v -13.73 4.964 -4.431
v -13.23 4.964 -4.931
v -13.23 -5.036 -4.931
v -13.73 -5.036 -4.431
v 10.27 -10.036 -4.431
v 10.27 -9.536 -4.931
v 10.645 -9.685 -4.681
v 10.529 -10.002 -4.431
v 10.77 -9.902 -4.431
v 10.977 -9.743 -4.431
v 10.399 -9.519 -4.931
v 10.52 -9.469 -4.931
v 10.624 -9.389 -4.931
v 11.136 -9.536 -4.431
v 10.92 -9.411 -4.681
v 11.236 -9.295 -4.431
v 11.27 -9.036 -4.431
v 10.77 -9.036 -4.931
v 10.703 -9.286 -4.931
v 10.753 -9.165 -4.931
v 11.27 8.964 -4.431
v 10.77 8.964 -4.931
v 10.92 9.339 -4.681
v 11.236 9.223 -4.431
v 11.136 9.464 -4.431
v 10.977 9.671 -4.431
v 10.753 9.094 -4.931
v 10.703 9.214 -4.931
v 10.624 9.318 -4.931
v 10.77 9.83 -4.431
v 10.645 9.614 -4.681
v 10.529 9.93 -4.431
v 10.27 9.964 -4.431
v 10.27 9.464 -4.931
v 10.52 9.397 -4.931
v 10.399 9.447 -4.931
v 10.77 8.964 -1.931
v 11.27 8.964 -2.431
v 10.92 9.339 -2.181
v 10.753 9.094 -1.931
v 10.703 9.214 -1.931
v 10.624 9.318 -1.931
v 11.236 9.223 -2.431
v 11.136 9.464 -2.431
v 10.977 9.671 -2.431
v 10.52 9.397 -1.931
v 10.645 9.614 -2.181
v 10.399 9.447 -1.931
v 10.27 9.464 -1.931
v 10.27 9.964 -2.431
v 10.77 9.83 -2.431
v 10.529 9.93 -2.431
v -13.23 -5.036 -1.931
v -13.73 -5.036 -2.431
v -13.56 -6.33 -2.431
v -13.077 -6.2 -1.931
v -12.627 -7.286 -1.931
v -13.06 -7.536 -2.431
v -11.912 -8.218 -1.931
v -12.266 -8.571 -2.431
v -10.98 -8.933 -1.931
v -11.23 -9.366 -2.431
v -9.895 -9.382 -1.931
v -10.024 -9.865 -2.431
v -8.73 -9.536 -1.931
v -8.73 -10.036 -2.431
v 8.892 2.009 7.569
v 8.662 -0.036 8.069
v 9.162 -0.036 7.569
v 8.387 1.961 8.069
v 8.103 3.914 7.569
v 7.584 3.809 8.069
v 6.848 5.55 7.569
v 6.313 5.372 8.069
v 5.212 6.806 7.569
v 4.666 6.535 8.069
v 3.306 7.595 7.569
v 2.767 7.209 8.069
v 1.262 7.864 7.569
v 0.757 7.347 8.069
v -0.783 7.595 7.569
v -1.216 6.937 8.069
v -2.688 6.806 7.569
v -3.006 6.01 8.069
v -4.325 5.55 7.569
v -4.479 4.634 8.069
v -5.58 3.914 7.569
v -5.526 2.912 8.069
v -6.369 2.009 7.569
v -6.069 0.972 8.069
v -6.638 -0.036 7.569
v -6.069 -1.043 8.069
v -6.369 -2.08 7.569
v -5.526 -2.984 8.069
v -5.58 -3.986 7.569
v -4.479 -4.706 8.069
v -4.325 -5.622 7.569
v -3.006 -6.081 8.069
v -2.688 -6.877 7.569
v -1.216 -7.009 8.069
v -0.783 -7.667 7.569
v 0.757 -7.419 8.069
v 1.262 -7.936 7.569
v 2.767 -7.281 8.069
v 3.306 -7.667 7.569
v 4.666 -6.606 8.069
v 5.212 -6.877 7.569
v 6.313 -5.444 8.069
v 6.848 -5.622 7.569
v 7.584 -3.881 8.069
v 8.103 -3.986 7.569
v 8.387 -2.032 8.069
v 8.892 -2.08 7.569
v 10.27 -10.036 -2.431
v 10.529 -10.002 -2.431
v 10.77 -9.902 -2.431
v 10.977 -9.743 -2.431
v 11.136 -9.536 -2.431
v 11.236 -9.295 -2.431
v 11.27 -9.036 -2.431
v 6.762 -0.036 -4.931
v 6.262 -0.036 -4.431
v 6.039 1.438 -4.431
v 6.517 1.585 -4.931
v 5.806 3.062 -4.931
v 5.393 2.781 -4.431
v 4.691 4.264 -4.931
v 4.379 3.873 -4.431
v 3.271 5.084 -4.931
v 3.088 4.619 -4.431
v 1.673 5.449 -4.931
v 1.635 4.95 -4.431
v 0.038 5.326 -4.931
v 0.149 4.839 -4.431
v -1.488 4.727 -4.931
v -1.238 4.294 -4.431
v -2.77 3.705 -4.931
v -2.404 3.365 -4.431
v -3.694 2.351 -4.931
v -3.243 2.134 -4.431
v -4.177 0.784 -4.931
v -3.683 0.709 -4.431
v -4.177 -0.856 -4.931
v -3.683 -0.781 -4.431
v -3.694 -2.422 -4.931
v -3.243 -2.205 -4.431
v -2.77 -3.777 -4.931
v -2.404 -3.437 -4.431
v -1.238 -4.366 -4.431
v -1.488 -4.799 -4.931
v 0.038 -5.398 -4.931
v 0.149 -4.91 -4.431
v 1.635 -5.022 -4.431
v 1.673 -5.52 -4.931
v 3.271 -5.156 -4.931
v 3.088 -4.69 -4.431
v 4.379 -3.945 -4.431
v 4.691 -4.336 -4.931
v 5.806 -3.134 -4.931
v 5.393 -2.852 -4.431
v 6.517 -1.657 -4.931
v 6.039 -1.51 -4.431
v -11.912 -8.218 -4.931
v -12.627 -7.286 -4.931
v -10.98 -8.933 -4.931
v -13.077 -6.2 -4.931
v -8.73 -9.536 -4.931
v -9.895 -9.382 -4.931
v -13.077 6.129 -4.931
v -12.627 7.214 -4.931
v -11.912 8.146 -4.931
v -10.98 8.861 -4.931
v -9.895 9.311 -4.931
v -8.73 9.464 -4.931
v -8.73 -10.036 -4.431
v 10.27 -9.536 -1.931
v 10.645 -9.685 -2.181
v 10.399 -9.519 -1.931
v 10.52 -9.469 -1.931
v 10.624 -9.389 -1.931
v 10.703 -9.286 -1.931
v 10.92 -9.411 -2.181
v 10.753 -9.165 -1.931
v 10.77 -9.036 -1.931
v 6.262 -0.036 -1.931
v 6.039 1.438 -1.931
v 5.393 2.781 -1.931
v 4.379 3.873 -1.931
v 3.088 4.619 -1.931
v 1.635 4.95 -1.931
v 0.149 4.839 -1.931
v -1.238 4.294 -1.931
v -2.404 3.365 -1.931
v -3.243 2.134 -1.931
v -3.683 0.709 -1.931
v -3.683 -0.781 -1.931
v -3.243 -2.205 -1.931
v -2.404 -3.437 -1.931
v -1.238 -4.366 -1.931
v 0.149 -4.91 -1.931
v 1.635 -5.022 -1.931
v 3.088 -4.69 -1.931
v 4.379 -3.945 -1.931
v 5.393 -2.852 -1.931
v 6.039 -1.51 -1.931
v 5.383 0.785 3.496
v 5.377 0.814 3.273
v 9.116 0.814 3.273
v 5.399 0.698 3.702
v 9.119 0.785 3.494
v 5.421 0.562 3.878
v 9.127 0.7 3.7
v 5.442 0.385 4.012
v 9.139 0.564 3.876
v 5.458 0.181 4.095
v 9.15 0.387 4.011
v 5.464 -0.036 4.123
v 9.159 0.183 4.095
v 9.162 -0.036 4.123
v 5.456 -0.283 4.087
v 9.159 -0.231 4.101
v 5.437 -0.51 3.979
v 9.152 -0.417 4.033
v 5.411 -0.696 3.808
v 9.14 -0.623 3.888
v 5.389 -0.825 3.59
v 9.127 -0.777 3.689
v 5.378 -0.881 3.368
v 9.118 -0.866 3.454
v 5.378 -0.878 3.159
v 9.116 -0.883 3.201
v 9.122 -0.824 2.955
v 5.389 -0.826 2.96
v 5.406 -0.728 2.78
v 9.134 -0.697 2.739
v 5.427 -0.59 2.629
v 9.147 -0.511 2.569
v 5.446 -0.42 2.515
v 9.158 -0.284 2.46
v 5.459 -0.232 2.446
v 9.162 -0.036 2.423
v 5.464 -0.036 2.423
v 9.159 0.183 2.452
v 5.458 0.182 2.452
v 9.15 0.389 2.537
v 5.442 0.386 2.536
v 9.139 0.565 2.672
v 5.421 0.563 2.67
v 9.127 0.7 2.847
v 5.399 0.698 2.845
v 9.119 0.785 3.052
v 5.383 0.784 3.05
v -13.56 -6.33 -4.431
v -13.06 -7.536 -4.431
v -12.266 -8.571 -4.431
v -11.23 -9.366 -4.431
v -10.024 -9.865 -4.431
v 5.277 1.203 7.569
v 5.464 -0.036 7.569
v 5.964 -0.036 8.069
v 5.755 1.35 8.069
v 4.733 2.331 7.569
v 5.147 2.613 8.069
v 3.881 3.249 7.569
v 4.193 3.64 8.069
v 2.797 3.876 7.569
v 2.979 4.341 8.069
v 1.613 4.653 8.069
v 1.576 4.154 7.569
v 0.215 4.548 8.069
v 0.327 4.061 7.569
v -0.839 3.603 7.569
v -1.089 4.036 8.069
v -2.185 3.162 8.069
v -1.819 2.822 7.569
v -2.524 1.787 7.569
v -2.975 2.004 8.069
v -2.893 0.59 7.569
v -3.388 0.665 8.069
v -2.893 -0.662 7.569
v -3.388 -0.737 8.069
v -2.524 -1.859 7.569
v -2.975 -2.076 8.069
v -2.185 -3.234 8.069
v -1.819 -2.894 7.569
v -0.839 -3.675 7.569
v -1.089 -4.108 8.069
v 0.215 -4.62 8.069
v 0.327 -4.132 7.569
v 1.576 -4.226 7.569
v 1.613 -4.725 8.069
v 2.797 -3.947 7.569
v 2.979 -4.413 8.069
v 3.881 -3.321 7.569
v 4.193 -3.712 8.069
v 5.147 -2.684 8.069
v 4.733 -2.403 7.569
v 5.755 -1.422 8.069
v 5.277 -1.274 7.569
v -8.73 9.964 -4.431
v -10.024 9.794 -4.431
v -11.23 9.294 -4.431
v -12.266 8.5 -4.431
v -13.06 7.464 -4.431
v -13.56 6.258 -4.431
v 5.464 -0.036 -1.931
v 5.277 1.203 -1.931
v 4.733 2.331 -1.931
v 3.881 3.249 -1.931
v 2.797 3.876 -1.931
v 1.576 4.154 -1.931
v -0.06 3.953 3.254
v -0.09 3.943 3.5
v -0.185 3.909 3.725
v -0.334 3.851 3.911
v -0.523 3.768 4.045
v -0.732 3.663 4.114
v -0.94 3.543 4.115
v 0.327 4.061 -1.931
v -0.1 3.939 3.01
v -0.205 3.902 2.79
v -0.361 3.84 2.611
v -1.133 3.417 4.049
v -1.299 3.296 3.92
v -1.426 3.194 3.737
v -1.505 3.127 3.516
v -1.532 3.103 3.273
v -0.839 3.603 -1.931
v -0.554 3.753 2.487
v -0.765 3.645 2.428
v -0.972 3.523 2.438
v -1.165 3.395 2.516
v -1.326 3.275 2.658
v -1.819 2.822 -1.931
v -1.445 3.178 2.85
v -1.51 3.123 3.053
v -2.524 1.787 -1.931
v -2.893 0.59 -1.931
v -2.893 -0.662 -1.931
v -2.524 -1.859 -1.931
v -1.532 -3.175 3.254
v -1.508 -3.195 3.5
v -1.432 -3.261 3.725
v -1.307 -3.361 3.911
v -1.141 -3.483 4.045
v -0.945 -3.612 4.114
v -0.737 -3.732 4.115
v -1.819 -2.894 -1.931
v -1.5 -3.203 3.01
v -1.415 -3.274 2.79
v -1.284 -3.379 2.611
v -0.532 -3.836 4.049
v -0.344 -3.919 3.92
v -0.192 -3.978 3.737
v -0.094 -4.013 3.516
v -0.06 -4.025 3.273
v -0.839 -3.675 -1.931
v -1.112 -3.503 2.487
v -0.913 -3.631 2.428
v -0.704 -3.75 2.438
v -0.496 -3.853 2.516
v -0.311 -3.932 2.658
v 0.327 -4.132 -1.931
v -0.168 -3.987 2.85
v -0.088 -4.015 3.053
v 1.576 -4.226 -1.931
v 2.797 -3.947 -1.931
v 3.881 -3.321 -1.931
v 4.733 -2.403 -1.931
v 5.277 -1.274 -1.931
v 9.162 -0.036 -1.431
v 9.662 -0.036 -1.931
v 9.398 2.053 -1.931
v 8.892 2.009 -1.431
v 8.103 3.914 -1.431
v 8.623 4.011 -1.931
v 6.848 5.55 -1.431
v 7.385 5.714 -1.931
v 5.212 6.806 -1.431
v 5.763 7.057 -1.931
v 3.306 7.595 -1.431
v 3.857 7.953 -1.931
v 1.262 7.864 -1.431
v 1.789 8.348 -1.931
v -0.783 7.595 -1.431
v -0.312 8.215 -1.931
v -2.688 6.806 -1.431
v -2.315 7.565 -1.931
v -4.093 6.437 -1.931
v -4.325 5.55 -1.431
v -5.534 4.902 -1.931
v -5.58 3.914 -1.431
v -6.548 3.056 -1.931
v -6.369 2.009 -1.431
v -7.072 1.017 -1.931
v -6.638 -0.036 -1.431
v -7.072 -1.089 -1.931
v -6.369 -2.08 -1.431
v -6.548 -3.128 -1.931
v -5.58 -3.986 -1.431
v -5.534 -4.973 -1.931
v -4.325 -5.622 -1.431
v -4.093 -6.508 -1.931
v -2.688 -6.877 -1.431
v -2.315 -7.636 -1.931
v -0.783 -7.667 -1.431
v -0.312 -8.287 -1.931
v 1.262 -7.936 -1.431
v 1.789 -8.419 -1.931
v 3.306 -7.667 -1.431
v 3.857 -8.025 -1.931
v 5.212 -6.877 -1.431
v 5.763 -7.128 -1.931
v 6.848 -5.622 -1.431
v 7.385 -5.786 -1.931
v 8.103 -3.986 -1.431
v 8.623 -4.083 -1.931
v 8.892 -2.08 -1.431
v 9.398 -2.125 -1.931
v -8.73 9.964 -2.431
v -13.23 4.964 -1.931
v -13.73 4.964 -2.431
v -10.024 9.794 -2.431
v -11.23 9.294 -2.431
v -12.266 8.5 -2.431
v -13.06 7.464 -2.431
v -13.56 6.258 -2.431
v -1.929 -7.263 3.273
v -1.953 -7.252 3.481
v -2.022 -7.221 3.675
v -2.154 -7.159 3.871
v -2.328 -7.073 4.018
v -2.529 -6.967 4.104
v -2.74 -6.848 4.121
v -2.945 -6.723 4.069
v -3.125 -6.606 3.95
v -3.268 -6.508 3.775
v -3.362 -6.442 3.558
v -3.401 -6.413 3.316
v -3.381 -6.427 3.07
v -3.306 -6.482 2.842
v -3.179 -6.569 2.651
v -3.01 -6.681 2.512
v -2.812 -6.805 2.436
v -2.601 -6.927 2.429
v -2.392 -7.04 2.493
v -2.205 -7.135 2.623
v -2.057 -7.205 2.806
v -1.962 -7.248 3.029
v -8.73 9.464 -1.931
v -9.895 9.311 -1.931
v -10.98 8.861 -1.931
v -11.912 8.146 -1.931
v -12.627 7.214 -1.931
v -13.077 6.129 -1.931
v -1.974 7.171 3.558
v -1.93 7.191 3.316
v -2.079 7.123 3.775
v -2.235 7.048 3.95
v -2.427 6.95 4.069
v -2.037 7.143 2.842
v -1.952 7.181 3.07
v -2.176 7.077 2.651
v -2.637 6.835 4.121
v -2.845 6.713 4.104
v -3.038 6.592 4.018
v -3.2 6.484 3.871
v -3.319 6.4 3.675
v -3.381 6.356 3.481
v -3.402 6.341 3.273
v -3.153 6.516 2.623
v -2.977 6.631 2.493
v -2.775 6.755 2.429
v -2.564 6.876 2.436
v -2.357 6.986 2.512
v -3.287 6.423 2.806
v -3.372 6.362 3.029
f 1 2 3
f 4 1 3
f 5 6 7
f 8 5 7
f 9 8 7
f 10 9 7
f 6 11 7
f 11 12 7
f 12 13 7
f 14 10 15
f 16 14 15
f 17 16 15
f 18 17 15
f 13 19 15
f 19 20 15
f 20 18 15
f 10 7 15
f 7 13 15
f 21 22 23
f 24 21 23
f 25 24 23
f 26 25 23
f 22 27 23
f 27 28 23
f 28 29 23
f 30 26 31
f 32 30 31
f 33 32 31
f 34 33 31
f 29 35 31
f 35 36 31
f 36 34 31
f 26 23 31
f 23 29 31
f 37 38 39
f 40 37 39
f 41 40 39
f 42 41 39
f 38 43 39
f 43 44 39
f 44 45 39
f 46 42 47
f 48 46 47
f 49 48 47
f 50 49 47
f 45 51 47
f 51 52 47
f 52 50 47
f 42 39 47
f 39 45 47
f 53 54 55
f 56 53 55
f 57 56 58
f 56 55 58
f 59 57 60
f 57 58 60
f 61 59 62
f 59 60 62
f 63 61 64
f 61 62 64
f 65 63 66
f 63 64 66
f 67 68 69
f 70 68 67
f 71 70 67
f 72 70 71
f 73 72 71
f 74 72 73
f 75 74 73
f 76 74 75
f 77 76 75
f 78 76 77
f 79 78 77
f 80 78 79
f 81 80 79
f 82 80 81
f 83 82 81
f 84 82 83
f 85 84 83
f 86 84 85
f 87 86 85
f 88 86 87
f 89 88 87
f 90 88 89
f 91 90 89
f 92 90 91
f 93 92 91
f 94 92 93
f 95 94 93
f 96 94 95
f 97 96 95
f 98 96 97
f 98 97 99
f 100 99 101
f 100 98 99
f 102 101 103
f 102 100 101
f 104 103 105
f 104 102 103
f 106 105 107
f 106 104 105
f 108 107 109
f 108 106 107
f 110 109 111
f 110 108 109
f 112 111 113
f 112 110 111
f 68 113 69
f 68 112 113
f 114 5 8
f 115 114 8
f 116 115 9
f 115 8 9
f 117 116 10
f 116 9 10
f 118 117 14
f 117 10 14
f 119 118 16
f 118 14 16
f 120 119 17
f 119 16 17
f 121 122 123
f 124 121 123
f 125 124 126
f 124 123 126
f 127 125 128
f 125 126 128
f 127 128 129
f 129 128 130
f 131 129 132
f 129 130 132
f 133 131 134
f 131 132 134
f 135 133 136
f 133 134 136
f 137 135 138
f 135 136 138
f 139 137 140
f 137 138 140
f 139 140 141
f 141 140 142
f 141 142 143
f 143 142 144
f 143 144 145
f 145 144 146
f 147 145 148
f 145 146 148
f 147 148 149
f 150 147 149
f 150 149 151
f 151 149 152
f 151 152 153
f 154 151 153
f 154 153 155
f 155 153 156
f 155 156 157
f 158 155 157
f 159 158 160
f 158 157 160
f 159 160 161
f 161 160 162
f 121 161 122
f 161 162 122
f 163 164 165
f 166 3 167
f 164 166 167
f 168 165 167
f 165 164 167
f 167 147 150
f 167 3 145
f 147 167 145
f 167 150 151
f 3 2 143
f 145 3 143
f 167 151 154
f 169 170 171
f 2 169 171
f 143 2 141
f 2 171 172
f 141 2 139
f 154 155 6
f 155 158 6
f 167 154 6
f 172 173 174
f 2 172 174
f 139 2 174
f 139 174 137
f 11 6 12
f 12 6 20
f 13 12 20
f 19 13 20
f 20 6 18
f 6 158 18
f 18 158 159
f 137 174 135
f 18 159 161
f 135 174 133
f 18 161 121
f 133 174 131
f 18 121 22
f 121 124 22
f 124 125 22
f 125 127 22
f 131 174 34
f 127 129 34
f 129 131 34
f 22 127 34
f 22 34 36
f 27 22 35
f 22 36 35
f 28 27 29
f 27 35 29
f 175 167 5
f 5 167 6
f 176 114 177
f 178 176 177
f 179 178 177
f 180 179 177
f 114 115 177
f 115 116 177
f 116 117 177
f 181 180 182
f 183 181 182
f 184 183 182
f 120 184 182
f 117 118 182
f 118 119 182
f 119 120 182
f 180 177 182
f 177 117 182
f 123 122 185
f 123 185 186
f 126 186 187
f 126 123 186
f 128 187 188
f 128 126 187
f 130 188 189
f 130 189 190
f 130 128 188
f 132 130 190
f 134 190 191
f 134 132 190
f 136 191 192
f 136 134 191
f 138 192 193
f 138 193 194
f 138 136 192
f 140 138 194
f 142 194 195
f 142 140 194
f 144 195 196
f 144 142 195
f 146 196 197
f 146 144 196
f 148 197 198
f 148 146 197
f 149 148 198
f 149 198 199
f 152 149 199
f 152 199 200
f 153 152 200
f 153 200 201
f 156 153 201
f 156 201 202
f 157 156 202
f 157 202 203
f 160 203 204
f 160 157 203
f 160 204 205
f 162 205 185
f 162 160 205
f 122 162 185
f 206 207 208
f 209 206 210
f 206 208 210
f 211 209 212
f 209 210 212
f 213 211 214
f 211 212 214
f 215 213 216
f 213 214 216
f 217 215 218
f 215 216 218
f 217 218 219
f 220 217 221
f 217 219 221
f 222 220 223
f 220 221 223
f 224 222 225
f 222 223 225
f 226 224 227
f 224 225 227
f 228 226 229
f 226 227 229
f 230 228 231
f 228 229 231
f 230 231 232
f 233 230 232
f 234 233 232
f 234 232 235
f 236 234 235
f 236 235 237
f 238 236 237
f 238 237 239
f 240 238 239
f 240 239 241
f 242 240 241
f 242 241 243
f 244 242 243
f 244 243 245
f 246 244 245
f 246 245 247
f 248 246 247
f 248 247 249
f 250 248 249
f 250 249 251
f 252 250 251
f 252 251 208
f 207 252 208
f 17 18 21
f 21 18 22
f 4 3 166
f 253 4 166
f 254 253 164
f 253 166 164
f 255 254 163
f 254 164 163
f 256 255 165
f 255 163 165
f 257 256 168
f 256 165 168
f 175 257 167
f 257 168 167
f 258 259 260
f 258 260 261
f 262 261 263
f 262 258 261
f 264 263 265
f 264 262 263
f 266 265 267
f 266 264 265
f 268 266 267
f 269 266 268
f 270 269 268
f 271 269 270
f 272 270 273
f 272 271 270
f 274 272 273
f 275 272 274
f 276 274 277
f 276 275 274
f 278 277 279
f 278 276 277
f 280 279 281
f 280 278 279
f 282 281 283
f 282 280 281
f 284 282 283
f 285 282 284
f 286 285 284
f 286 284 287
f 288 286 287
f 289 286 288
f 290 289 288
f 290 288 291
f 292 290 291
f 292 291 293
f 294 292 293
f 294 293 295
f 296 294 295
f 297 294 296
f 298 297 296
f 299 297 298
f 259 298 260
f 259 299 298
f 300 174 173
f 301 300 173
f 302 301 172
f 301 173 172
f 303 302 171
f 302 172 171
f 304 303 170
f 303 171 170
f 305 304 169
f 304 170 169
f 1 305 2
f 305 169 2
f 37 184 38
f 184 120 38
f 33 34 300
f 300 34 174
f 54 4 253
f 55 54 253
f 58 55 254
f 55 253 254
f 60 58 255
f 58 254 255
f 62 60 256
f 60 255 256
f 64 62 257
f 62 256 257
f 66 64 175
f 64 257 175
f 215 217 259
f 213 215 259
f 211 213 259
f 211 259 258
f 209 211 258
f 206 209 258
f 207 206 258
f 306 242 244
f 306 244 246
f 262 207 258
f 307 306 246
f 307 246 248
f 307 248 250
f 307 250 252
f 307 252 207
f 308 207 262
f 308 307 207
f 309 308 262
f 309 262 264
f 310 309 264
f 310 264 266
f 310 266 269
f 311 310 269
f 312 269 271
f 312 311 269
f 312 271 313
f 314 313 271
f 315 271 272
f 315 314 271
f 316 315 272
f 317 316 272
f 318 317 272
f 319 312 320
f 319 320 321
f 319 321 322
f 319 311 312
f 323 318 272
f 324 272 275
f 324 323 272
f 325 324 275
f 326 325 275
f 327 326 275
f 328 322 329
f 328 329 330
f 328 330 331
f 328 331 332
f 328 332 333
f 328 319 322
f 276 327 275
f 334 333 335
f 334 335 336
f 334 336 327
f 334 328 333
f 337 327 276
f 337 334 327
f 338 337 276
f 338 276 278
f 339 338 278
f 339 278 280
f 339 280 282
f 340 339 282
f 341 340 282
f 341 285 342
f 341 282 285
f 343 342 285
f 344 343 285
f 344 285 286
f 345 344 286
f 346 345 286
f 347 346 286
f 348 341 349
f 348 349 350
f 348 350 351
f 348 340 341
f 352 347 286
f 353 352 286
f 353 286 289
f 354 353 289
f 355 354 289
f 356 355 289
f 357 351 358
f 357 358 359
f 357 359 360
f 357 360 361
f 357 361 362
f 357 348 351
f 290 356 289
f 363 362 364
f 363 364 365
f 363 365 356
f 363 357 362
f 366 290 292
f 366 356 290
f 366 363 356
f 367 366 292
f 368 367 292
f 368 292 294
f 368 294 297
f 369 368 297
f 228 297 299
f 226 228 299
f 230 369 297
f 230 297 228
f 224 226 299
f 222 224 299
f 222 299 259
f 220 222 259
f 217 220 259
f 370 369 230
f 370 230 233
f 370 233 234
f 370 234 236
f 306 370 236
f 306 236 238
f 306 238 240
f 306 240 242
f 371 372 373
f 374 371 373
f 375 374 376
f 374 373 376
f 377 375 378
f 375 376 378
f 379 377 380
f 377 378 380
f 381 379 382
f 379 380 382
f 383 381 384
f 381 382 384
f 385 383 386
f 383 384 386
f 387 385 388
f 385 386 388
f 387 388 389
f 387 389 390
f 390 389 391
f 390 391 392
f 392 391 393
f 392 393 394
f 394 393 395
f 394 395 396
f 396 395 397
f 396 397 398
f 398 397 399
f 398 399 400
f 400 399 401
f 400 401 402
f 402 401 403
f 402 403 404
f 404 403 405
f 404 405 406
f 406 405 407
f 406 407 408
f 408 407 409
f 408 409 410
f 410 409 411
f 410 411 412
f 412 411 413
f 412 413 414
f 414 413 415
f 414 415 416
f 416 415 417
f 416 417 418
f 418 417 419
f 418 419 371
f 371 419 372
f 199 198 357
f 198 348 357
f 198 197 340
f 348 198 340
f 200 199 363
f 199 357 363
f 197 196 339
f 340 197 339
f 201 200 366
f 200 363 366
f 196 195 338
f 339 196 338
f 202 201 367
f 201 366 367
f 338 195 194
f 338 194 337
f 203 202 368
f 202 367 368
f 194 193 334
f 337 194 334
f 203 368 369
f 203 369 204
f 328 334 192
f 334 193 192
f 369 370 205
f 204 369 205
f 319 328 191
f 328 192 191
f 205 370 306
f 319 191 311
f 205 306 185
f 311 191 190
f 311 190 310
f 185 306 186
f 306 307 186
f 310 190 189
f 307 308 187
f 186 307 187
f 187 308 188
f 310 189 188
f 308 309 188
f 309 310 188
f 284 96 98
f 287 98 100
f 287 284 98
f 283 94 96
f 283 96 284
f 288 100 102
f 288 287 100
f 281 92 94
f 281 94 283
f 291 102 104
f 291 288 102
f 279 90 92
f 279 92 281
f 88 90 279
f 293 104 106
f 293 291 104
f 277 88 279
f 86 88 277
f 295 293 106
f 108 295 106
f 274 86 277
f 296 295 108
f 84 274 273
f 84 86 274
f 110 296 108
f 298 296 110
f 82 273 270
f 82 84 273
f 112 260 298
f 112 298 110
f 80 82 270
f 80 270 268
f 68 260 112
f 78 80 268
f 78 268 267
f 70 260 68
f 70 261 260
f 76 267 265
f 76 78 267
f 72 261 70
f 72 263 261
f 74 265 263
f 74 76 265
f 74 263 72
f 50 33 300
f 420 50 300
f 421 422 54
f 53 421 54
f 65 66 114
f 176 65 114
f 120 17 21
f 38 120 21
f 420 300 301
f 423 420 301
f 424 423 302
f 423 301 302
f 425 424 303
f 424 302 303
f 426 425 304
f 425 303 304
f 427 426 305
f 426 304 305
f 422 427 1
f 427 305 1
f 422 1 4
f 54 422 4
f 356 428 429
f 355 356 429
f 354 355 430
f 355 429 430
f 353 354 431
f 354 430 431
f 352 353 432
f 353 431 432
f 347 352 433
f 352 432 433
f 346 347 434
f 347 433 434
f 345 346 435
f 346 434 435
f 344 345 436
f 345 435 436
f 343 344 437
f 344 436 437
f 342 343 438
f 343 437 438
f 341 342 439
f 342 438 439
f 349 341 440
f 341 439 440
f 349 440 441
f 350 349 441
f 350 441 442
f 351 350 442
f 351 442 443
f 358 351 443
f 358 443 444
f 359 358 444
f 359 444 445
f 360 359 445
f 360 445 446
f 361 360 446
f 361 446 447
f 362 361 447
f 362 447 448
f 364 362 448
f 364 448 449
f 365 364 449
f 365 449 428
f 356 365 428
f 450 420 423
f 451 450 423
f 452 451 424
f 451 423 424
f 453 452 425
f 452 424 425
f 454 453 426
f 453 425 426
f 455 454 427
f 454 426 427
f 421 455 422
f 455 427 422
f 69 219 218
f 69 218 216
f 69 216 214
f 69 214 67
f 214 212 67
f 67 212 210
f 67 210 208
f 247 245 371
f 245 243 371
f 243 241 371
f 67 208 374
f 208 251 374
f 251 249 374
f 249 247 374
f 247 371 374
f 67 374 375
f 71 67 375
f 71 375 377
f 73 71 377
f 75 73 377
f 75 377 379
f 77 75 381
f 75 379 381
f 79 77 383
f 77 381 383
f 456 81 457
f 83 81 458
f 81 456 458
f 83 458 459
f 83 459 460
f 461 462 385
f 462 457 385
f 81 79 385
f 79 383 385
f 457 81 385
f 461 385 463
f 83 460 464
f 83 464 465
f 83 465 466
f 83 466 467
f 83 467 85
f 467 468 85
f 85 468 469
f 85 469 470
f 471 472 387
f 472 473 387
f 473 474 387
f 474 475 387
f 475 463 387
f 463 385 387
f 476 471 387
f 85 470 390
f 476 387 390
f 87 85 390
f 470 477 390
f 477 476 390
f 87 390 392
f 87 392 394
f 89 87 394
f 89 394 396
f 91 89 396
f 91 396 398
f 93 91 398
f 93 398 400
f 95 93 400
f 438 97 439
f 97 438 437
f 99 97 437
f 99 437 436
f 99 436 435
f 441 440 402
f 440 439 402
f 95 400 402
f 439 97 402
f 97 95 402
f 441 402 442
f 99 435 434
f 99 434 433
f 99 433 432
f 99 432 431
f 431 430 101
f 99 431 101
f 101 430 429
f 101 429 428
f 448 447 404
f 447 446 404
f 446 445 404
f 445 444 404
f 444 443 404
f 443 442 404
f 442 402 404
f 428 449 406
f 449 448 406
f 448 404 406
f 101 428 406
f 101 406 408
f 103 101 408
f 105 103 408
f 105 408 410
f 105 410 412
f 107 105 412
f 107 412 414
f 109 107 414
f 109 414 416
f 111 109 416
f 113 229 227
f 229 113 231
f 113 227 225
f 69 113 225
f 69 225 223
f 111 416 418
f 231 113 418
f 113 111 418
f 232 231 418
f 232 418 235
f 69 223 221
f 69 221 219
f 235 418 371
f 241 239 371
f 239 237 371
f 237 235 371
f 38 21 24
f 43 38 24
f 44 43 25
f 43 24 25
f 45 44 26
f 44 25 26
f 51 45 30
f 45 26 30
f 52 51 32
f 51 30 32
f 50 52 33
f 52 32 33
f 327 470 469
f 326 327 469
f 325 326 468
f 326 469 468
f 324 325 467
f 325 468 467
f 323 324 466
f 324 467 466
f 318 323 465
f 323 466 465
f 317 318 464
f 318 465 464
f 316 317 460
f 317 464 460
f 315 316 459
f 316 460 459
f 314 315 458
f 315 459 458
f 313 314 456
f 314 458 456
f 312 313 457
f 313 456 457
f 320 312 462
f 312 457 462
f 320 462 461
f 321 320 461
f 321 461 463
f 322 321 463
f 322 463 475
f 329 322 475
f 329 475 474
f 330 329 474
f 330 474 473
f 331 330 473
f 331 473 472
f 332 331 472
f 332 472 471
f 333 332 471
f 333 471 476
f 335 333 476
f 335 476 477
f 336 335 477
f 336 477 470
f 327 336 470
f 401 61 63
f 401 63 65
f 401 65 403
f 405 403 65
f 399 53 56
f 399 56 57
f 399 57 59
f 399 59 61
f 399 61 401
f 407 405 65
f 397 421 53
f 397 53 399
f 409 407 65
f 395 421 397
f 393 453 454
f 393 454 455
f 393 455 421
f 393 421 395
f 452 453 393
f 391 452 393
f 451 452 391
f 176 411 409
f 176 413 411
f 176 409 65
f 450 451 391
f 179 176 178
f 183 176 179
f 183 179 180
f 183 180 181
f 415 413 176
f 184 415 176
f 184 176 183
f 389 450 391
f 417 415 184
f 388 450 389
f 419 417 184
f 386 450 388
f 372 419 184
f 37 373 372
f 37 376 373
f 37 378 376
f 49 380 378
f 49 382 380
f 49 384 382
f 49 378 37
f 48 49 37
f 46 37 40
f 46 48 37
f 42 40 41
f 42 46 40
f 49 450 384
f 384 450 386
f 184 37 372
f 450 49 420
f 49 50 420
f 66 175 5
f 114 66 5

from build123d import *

# Parameters (mm, degrees)
SKETCH1_R                      = 0.005
BOSS_EXTRUDE1_DEPTH            = 0.003
SKETCH2_R                      = 0.0079
SKETCH2_R_2                    = 0.004201919
BOSS_EXTRUDE3_DEPTH            = 0.01
CHAMFER1_SIZE                  = 0.0005
CUT_EXTRUDE1_REACH             = 2.054
SKETCH3_R                      = 0.00085
CUT_EXTRUDE1_DIRECTION_2_DEPTH = 1.053763073
CIRPATTERN1_COUNT              = 3
SCALE1_SCALE                   = 1000


with BuildPart() as part:
    # Sketch1 → Boss-Extrude1 (new body)
    with BuildSketch(Plane.XY):
        with BuildLine():
            Line((0.009008368, -0.025787204), (-0.009991632, -0.025787204))
            ThreePointArc((-0.009991632, -0.025787204), (-0.013527166, -0.02725167), (-0.014991632, -0.030787204))
            Line((-0.014991632, -0.030787204), (-0.014991632, -0.040787204))
            ThreePointArc((-0.014991632, -0.040787204), (-0.013527166, -0.044322738), (-0.009991632, -0.045787204))
            Line((-0.009991632, -0.045787204), (0.009008368, -0.045787204))
            ThreePointArc((0.009008368, -0.045787204), (0.009715474, -0.045494311), (0.010008368, -0.044787204))
            Line((0.010008368, -0.044787204), (0.010008368, -0.026787204))
            ThreePointArc((0.010008368, -0.026787204), (0.009715474, -0.026080097), (0.009008368, -0.025787204))
        make_face()
        with Locations((0, -0.035787204)):
            Circle(SKETCH1_R, mode=Mode.SUBTRACT)
    extrude(amount=BOSS_EXTRUDE1_DEPTH)

    # Sketch2 → Boss-Extrude3 (add)
    with BuildSketch(Plane.XY.offset(0.003)):
        with Locations((0, -0.035787204)):
            Circle(SKETCH2_R)
        with Locations((0, -0.035787204)):
            Circle(SKETCH2_R_2, mode=Mode.SUBTRACT)
    extrude(amount=BOSS_EXTRUDE3_DEPTH)

    # Chamfer1
    chamfer1_edges = [part.edges().sort_by_distance(p)[0] for p in [
        (-0.000491632, -0.045787204, 0),
        (-0.013527166, -0.044322738, 0),
        (-0.014991632, -0.035787204, 0),
        (0.009715474, -0.045494311, 0.003),
        (-0.013527166, -0.02725167, 0),
        (-0.000491632, -0.025787204, 0),
        (0.009715474, -0.026080097, 0),
        (0.010008368, -0.035787204, 0),
        (0.009715474, -0.045494311, 0),
        (-0.005, -0.035787204, 0),
        (0.010008368, -0.035787204, 0.003),
        (0.009715474, -0.026080097, 0.003),
        (-0.000491632, -0.025787204, 0.003),
        (-0.0079, -0.035787204, 0.003),
        (-0.013527166, -0.02725167, 0.003),
        (-0.0079, -0.035787204, 0.013),
        (-0.004201919, -0.035787204, 0.013),
        (-0.014991632, -0.035787204, 0.003),
        (-0.013527166, -0.044322738, 0.003),
        (-0.000491632, -0.045787204, 0.003),
    ]]
    chamfer(chamfer1_edges, length=CHAMFER1_SIZE)

    # Sketch3 → Cut-Extrude1 (cut, up to next)
    with BuildSketch(Plane(origin=(0.010008368, 0, 0), x_dir=(0, 0, -1), z_dir=(1, 0, 0)), mode=Mode.PRIVATE) as cut_extrude1_sk1:
        with Locations(Location((-0.008204866, -0.035787204, 0), (0, 0, 90))):
            Circle(SKETCH3_R)
    cut_extrude1_tool1 = extrude(cut_extrude1_sk1.sketch, amount=-CUT_EXTRUDE1_REACH, mode=Mode.PRIVATE) & part.part
    cut_extrude1 = cut_extrude1_tool1.solids().sort_by_distance((0.010008, -0.035787, 0.008205))[0]
    add(cut_extrude1, mode=Mode.SUBTRACT)

    # Sketch3 → Cut-Extrude1 direction 2 (cut)
    with BuildSketch(Plane(origin=(0.010008368, 0, 0), x_dir=(0, 0, -1), z_dir=(1, 0, 0))):
        with Locations(Location((-0.008204866, -0.035787204, 0), (0, 0, 90))):
            Circle(SKETCH3_R)
    cut_extrude1_direction_2 = extrude(amount=CUT_EXTRUDE1_DIRECTION_2_DEPTH, mode=Mode.SUBTRACT)

    # CirPattern1: Cut-Extrude1, Cut-Extrude1 direction 2 ×3 about axis
    cirpattern1_axis = Axis((0, -0.035787204, 0.0125), (0, 0, 1))
    add([cut_extrude1.rotate(cirpattern1_axis, i * 360 / CIRPATTERN1_COUNT) for i in range(1, CIRPATTERN1_COUNT)], mode=Mode.SUBTRACT)
    add([cut_extrude1_direction_2.rotate(cirpattern1_axis, i * 360 / CIRPATTERN1_COUNT) for i in range(1, CIRPATTERN1_COUNT)], mode=Mode.SUBTRACT)


with BuildPart() as part_1:
    # Scale1: scaled about (-0.001262886, -0.035787205, 0.004936409)
    add(part.part.scale(SCALE1_SCALE).moved(Location((1.261623114, 35.751417795, -4.931472591))))


solid = part_1.part
